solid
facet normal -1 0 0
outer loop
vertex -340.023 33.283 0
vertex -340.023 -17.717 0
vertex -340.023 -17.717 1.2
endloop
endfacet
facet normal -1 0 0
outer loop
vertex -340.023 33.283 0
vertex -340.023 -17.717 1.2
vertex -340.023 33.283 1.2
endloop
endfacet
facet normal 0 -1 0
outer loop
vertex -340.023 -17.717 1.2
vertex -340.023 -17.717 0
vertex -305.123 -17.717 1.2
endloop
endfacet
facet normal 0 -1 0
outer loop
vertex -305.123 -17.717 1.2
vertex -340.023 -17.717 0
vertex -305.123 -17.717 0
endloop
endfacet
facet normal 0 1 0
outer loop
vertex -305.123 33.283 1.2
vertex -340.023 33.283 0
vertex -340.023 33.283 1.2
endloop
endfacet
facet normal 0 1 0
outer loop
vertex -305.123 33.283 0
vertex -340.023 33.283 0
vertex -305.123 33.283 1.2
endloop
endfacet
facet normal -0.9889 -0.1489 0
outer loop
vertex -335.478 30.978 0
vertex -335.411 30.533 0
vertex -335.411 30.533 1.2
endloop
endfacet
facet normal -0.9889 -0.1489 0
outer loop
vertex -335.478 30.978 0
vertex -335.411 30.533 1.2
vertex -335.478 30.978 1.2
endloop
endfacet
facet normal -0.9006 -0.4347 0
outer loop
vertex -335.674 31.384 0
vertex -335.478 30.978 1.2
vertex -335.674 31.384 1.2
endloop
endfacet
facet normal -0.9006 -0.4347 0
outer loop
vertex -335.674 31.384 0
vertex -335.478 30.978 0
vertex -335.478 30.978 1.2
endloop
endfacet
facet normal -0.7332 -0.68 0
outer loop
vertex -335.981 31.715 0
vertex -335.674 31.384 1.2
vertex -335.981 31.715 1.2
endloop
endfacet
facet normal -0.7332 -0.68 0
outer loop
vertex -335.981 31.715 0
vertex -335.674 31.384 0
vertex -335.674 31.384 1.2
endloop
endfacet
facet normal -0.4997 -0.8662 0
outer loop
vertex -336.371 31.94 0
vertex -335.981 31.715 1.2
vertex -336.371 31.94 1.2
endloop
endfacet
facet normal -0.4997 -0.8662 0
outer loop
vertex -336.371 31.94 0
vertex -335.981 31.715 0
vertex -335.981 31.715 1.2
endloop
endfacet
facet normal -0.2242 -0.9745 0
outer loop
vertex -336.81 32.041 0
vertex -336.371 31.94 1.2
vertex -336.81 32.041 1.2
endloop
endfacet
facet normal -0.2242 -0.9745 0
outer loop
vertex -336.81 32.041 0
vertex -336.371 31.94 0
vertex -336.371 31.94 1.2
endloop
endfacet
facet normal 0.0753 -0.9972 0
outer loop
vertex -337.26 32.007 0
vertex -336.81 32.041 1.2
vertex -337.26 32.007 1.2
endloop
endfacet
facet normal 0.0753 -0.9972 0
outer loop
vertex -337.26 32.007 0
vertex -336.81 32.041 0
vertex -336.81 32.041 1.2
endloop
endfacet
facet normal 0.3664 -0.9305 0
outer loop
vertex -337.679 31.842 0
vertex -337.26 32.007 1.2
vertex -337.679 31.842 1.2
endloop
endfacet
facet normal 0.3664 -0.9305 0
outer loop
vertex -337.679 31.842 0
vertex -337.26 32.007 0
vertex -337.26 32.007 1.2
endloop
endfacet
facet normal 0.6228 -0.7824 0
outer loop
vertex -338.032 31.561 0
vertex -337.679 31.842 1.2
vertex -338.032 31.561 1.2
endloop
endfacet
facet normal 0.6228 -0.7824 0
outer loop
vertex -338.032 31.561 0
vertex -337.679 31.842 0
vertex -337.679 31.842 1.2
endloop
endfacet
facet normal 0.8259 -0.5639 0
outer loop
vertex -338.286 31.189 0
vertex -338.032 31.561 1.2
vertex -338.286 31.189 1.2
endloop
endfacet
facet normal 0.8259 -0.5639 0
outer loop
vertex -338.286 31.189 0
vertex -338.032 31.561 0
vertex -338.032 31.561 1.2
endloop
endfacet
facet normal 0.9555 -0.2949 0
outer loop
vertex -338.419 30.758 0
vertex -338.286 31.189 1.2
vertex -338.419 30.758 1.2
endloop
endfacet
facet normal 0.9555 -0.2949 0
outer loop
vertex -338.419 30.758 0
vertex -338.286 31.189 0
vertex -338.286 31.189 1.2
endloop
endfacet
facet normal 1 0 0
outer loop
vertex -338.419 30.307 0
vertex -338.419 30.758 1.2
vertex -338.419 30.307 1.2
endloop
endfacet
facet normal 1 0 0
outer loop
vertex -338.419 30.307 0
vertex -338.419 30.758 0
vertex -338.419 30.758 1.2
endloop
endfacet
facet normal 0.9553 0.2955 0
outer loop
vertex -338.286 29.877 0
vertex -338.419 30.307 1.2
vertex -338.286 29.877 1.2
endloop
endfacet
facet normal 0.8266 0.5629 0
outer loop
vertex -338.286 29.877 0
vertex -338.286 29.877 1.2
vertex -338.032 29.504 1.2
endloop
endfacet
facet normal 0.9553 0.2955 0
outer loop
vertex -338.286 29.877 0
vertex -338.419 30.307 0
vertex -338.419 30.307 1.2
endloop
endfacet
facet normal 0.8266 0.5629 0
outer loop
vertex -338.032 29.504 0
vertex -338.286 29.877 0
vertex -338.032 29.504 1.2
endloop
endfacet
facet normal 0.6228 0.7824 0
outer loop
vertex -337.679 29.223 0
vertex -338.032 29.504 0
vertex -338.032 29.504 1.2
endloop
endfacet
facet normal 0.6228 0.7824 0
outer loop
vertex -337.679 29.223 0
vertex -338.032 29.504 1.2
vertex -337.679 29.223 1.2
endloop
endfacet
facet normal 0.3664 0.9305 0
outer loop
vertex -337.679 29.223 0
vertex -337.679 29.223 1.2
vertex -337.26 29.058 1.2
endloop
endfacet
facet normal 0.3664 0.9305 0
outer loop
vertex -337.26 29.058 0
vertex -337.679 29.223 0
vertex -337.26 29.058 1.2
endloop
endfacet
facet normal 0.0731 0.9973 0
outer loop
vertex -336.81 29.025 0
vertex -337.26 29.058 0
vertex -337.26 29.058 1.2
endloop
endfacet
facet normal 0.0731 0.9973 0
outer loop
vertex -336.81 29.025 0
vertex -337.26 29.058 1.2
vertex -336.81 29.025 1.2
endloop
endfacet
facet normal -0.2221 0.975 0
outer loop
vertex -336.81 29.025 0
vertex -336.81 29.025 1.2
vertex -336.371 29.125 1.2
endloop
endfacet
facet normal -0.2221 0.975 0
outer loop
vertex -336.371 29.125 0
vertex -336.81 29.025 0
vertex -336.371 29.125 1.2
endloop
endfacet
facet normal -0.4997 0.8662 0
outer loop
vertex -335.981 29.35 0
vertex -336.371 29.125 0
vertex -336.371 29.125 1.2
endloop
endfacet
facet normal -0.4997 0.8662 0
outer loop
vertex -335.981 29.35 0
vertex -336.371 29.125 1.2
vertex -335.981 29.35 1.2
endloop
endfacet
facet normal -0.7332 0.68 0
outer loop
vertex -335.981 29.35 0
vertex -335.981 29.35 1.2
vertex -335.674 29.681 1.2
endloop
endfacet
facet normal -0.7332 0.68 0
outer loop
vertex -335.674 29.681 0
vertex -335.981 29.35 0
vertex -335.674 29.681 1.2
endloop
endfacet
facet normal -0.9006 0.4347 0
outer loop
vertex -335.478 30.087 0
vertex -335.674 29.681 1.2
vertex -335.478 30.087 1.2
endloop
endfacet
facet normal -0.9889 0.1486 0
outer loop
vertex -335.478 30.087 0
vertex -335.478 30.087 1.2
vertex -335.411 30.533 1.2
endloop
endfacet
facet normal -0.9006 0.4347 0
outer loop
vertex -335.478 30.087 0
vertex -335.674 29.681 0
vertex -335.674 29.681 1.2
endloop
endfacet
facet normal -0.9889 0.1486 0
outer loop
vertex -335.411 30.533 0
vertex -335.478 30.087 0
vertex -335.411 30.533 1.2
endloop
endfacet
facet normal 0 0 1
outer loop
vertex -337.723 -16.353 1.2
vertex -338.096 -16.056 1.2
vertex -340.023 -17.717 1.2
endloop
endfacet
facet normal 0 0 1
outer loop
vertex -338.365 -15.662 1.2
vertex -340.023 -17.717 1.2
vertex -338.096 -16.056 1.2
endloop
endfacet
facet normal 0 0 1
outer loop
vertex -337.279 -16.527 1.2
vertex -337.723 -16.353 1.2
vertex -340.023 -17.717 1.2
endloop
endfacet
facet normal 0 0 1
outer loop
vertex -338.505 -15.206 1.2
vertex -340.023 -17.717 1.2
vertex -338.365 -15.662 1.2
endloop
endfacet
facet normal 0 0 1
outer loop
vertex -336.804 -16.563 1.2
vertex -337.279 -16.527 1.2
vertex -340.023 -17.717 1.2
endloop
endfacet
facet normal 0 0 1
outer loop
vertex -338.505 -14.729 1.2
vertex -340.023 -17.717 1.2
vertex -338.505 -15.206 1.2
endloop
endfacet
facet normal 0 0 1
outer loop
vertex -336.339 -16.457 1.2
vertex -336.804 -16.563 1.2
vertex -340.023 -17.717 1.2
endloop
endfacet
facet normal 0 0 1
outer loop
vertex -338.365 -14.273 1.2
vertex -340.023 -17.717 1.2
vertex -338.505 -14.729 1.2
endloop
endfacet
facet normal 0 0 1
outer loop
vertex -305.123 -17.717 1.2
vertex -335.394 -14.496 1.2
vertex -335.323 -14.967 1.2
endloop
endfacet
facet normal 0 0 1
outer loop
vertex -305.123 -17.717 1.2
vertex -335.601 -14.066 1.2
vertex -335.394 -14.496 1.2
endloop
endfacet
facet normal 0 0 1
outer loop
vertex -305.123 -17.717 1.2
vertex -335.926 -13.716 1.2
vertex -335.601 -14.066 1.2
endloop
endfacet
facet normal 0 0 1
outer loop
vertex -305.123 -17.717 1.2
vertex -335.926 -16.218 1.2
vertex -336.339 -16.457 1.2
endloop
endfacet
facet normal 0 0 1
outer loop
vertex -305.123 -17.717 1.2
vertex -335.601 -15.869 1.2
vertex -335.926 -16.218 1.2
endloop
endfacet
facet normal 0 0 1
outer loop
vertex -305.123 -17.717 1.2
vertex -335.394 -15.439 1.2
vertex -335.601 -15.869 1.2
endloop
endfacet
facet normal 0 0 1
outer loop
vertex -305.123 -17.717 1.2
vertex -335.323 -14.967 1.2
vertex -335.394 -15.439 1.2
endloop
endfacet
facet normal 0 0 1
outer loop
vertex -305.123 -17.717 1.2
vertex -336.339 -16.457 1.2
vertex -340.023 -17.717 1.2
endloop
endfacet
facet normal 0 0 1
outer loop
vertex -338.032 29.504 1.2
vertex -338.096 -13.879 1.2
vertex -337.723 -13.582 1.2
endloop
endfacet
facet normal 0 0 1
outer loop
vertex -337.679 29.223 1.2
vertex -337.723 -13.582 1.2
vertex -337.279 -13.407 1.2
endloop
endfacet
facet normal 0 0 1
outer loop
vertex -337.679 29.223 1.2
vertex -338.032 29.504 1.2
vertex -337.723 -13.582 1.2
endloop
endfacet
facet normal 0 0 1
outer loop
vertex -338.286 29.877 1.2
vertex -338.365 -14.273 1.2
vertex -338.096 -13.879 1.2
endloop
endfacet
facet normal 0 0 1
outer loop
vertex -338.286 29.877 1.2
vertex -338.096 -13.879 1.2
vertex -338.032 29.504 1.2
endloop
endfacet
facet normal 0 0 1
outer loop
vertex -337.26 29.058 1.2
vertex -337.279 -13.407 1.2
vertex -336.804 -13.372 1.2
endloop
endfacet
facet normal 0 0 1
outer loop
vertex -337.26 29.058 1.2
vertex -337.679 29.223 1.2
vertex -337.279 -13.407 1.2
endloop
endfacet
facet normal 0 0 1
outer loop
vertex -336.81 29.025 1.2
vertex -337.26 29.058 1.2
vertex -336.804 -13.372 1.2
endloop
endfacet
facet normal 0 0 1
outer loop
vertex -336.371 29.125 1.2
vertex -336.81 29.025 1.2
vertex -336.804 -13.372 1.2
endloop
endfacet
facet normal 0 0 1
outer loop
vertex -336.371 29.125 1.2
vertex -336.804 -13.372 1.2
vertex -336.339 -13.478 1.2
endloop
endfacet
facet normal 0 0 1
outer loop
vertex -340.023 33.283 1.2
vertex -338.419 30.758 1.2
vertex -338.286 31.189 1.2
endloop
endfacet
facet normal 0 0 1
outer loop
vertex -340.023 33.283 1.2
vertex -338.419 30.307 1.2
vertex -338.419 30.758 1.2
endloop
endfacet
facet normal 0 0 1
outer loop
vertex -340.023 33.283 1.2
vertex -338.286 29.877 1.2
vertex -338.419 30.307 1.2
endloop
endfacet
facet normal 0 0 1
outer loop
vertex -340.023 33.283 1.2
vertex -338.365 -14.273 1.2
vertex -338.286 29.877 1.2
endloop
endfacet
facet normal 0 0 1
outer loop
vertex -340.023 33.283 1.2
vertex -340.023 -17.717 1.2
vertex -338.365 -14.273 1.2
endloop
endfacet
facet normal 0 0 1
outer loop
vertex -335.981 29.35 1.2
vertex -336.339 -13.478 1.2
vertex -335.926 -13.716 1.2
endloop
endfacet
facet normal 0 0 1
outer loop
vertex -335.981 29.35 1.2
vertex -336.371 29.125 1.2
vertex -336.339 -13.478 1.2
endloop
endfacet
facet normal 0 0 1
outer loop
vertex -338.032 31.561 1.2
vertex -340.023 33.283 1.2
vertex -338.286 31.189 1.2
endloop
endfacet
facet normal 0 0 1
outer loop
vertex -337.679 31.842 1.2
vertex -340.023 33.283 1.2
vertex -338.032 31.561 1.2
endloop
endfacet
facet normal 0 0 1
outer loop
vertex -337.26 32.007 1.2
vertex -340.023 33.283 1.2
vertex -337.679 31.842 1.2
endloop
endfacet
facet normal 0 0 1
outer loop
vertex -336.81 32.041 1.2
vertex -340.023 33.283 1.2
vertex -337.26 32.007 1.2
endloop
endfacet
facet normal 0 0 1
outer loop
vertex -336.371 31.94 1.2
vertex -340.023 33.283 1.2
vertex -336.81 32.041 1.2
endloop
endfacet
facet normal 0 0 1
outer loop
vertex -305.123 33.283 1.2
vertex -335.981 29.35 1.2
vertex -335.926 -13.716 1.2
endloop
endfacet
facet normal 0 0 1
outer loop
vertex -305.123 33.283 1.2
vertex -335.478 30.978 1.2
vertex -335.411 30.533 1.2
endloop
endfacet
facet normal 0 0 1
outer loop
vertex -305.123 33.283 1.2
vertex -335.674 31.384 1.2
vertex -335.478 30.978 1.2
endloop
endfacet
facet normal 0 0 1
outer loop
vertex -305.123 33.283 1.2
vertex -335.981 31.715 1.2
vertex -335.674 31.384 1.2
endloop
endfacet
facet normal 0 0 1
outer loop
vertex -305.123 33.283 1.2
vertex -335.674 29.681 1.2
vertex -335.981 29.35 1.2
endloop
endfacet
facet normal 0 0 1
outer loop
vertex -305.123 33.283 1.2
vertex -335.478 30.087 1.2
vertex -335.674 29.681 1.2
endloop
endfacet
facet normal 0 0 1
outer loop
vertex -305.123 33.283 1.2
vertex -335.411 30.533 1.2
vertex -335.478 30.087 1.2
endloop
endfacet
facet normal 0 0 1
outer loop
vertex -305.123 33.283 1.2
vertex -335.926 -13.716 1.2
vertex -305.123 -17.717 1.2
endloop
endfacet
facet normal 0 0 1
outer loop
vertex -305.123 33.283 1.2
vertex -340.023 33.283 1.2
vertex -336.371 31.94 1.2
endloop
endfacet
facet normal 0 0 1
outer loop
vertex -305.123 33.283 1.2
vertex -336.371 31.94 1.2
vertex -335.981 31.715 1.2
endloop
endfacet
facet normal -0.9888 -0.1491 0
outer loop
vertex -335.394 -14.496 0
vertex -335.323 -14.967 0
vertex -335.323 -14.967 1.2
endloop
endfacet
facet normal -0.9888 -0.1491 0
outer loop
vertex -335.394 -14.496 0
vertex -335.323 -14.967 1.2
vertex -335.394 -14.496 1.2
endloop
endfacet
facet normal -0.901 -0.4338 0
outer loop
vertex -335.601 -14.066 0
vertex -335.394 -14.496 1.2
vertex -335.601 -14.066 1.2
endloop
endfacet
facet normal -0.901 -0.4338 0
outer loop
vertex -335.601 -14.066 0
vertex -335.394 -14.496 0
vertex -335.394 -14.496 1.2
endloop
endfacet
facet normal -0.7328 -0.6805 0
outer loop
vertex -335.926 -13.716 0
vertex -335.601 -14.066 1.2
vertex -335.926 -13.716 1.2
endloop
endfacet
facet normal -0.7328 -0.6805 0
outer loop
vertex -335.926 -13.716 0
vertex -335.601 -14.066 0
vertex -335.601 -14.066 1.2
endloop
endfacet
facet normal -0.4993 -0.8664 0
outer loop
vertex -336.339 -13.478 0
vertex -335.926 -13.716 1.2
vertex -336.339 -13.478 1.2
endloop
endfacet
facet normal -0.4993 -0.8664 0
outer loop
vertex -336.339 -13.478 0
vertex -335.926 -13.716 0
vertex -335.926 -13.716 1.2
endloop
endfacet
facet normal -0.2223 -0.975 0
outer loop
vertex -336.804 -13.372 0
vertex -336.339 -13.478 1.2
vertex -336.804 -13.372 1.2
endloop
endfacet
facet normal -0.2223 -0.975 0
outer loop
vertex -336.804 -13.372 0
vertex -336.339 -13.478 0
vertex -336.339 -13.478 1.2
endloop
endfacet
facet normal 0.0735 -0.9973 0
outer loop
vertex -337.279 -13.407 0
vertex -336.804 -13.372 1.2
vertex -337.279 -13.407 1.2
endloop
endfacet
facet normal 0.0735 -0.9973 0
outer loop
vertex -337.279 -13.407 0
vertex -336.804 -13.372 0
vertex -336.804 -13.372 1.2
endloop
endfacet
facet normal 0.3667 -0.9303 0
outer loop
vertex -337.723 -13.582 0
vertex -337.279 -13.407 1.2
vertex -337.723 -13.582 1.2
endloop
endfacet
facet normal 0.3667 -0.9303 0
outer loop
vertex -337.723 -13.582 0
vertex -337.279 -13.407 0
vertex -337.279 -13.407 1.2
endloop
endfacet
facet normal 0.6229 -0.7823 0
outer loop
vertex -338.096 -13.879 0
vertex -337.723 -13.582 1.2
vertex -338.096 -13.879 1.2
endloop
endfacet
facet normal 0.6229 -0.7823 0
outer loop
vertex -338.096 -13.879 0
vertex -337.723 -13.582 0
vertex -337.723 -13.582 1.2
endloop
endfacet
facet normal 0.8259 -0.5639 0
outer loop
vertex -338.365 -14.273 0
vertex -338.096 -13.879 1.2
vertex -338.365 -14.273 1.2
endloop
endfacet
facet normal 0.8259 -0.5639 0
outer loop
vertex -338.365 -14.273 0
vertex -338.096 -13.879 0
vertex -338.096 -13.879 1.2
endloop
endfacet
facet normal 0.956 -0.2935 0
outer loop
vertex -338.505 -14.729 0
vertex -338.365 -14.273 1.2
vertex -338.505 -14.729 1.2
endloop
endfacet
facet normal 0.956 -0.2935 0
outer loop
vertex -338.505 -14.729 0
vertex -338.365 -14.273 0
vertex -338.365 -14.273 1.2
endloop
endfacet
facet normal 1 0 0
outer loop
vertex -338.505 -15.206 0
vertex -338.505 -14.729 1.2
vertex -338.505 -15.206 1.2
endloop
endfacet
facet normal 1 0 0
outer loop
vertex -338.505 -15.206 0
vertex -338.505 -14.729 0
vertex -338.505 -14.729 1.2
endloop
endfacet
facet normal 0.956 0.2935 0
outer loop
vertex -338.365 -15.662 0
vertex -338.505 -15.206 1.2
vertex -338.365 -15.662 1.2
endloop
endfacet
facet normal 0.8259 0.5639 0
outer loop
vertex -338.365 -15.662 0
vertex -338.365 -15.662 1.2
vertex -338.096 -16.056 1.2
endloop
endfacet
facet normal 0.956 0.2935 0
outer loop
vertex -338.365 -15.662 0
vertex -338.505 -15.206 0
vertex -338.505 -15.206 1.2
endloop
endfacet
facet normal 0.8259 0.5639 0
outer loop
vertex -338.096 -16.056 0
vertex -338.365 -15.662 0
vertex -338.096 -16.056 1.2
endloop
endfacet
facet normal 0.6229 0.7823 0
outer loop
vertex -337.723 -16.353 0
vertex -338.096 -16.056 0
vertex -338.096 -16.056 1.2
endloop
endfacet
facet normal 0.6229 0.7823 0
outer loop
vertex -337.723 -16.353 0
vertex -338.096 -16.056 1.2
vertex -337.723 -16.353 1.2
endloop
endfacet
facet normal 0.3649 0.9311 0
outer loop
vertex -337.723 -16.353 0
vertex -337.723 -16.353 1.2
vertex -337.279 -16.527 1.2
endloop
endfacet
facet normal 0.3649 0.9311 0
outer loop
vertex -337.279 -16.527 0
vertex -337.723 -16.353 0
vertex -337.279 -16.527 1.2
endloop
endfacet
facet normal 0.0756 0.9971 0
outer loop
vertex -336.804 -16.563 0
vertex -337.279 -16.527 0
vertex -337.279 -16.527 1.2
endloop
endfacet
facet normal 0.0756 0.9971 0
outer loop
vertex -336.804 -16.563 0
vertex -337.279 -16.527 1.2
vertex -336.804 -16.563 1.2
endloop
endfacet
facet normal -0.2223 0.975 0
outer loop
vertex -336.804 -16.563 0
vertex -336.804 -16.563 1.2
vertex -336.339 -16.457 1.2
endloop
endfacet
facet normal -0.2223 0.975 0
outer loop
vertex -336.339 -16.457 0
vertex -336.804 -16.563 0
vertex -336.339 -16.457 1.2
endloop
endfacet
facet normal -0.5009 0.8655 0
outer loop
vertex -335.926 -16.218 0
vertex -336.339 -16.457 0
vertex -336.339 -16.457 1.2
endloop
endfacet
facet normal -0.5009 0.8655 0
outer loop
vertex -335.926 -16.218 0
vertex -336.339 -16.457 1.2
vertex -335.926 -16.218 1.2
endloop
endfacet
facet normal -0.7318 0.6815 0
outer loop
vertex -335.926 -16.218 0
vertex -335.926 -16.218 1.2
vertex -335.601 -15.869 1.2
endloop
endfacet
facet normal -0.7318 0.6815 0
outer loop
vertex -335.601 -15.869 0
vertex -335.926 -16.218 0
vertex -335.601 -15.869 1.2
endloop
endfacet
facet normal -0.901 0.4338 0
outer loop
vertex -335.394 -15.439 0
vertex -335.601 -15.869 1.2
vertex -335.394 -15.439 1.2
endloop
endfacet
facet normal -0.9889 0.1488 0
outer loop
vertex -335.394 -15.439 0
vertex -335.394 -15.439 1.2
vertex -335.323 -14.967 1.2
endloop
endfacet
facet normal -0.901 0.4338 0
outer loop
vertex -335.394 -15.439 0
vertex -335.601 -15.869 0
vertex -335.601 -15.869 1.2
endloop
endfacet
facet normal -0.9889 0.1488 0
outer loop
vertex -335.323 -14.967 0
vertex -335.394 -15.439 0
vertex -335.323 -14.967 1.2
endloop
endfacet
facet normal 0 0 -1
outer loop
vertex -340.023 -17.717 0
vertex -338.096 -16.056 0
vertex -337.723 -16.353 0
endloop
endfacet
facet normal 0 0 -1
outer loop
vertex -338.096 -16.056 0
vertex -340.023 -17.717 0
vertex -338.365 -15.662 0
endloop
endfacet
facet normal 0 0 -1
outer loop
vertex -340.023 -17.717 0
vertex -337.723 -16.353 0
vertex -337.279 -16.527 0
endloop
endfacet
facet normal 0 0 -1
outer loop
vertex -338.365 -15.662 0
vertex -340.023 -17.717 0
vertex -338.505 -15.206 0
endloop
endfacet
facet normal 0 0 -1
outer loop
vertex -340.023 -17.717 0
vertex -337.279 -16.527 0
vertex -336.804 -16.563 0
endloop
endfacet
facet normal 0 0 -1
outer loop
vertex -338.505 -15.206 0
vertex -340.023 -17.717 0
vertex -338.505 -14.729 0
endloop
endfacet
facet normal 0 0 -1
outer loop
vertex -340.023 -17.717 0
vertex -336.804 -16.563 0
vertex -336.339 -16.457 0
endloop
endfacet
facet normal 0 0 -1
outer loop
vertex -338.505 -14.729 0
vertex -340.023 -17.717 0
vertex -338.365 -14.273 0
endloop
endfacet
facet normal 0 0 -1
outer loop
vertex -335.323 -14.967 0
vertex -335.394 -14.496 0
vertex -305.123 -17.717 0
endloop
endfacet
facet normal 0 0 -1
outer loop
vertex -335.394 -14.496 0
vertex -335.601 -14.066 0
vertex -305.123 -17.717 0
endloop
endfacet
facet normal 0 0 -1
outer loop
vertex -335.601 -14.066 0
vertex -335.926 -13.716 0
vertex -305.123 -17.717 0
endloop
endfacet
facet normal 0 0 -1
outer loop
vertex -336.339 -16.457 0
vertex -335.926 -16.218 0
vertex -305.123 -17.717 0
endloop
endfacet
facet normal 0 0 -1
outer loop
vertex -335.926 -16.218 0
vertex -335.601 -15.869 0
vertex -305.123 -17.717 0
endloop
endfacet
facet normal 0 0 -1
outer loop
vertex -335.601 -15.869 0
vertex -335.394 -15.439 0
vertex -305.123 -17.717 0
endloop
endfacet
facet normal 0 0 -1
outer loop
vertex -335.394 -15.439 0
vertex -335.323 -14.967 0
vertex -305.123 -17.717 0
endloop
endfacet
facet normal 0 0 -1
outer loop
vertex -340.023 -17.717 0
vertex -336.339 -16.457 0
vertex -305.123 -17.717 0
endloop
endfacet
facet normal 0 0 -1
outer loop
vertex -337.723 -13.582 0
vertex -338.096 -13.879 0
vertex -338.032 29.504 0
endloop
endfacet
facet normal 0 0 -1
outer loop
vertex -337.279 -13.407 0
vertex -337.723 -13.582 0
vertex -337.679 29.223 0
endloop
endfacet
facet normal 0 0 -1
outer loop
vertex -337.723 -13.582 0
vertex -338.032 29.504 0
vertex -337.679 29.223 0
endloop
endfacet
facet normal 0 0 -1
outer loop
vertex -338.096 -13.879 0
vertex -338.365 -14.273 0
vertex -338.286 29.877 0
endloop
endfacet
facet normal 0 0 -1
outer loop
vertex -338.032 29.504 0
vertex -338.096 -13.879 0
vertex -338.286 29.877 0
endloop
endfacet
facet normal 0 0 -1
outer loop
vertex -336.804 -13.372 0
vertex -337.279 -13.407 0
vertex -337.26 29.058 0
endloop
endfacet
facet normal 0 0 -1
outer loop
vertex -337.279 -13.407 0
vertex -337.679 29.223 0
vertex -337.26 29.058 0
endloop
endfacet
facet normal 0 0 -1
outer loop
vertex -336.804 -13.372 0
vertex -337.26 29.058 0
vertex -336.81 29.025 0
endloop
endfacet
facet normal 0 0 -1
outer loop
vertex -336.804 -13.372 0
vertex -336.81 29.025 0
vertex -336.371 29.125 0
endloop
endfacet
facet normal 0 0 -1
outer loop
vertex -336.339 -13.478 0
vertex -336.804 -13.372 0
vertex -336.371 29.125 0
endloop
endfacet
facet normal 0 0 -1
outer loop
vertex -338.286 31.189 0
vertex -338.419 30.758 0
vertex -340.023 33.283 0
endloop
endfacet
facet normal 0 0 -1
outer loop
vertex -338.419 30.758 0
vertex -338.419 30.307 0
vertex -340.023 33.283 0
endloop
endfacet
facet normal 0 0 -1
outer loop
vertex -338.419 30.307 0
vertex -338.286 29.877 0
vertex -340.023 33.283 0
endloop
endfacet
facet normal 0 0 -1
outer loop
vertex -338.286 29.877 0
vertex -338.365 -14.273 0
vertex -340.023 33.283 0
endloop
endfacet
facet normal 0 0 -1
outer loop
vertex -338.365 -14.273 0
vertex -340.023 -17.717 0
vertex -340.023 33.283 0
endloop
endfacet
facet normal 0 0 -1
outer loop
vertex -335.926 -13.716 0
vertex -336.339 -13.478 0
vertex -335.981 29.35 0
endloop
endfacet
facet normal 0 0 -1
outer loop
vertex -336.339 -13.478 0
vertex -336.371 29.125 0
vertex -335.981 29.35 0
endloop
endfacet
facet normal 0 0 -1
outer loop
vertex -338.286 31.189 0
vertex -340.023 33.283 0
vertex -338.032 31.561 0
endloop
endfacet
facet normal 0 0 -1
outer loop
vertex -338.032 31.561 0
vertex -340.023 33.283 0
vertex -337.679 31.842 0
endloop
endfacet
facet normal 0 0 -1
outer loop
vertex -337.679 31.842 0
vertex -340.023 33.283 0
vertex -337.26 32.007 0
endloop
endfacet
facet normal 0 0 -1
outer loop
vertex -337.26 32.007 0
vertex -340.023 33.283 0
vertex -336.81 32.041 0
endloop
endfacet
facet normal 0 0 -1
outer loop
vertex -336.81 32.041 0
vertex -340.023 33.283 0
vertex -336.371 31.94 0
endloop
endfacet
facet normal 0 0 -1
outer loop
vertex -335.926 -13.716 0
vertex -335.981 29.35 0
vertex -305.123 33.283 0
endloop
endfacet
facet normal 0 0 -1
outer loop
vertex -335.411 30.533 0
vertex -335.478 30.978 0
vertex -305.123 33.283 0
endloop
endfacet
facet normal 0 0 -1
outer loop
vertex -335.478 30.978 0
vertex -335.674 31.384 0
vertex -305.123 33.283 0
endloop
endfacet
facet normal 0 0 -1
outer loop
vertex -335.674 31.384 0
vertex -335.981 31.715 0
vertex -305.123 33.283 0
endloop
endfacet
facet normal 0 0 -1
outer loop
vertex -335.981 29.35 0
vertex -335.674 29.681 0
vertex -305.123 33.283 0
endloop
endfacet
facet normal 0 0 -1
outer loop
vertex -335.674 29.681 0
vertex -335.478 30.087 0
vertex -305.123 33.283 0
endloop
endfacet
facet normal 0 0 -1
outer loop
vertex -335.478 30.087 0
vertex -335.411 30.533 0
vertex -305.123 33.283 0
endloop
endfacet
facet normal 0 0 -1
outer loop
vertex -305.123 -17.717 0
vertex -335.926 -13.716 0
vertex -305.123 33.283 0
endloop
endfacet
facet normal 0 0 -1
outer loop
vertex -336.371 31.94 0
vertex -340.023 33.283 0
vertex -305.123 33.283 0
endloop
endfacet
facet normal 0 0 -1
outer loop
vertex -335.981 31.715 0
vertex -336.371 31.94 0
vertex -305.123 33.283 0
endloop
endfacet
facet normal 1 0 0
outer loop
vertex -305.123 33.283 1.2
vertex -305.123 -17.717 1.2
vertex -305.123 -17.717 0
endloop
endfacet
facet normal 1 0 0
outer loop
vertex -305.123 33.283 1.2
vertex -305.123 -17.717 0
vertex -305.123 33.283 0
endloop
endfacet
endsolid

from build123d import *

# Parameters (mm, degrees)
SKETCH_1_W          = 69.8
SKETCH_1_H          = 51
SKETCH_1_R          = 1.512119171
SKETCH_1_R_2        = 1.6
EXTRUDE_1_DEPTH     = 1.2
SKETCH_2_W          = 34.9
SKETCH_2_H          = 51
CUT_EXTRUDE_1_DEPTH = 342.65045794


with BuildPart() as part:
    # Эскиз1 → Бобышка-Вытянуть1 (new body)
    with BuildSketch(Plane.XY):
        with Locations((-305.123327031, 7.782615371)):
            Rectangle(SKETCH_1_W, SKETCH_1_H)
        with Locations((-336.923327031, 30.532615371)):
            Circle(SKETCH_1_R, mode=Mode.SUBTRACT)
        with Locations((-336.923327031, -14.967384629)):
            Circle(SKETCH_1_R_2, mode=Mode.SUBTRACT)
        with Locations((-273.323327031, 30.532615371)):
            Circle(SKETCH_1_R_2, mode=Mode.SUBTRACT)
        with Locations((-273.323327031, -14.967384629)):
            Circle(SKETCH_1_R_2, mode=Mode.SUBTRACT)
    extrude(amount=EXTRUDE_1_DEPTH)

    # Эскиз2 → Вырез-Вытянуть1 (cut, through all)
    with BuildSketch(Plane.XY.offset(1.2)):
        with Locations((-287.673327031, 7.782615371)):
            Rectangle(SKETCH_2_W, SKETCH_2_H)
    extrude(amount=-CUT_EXTRUDE_1_DEPTH, mode=Mode.SUBTRACT)


solid = part.part
